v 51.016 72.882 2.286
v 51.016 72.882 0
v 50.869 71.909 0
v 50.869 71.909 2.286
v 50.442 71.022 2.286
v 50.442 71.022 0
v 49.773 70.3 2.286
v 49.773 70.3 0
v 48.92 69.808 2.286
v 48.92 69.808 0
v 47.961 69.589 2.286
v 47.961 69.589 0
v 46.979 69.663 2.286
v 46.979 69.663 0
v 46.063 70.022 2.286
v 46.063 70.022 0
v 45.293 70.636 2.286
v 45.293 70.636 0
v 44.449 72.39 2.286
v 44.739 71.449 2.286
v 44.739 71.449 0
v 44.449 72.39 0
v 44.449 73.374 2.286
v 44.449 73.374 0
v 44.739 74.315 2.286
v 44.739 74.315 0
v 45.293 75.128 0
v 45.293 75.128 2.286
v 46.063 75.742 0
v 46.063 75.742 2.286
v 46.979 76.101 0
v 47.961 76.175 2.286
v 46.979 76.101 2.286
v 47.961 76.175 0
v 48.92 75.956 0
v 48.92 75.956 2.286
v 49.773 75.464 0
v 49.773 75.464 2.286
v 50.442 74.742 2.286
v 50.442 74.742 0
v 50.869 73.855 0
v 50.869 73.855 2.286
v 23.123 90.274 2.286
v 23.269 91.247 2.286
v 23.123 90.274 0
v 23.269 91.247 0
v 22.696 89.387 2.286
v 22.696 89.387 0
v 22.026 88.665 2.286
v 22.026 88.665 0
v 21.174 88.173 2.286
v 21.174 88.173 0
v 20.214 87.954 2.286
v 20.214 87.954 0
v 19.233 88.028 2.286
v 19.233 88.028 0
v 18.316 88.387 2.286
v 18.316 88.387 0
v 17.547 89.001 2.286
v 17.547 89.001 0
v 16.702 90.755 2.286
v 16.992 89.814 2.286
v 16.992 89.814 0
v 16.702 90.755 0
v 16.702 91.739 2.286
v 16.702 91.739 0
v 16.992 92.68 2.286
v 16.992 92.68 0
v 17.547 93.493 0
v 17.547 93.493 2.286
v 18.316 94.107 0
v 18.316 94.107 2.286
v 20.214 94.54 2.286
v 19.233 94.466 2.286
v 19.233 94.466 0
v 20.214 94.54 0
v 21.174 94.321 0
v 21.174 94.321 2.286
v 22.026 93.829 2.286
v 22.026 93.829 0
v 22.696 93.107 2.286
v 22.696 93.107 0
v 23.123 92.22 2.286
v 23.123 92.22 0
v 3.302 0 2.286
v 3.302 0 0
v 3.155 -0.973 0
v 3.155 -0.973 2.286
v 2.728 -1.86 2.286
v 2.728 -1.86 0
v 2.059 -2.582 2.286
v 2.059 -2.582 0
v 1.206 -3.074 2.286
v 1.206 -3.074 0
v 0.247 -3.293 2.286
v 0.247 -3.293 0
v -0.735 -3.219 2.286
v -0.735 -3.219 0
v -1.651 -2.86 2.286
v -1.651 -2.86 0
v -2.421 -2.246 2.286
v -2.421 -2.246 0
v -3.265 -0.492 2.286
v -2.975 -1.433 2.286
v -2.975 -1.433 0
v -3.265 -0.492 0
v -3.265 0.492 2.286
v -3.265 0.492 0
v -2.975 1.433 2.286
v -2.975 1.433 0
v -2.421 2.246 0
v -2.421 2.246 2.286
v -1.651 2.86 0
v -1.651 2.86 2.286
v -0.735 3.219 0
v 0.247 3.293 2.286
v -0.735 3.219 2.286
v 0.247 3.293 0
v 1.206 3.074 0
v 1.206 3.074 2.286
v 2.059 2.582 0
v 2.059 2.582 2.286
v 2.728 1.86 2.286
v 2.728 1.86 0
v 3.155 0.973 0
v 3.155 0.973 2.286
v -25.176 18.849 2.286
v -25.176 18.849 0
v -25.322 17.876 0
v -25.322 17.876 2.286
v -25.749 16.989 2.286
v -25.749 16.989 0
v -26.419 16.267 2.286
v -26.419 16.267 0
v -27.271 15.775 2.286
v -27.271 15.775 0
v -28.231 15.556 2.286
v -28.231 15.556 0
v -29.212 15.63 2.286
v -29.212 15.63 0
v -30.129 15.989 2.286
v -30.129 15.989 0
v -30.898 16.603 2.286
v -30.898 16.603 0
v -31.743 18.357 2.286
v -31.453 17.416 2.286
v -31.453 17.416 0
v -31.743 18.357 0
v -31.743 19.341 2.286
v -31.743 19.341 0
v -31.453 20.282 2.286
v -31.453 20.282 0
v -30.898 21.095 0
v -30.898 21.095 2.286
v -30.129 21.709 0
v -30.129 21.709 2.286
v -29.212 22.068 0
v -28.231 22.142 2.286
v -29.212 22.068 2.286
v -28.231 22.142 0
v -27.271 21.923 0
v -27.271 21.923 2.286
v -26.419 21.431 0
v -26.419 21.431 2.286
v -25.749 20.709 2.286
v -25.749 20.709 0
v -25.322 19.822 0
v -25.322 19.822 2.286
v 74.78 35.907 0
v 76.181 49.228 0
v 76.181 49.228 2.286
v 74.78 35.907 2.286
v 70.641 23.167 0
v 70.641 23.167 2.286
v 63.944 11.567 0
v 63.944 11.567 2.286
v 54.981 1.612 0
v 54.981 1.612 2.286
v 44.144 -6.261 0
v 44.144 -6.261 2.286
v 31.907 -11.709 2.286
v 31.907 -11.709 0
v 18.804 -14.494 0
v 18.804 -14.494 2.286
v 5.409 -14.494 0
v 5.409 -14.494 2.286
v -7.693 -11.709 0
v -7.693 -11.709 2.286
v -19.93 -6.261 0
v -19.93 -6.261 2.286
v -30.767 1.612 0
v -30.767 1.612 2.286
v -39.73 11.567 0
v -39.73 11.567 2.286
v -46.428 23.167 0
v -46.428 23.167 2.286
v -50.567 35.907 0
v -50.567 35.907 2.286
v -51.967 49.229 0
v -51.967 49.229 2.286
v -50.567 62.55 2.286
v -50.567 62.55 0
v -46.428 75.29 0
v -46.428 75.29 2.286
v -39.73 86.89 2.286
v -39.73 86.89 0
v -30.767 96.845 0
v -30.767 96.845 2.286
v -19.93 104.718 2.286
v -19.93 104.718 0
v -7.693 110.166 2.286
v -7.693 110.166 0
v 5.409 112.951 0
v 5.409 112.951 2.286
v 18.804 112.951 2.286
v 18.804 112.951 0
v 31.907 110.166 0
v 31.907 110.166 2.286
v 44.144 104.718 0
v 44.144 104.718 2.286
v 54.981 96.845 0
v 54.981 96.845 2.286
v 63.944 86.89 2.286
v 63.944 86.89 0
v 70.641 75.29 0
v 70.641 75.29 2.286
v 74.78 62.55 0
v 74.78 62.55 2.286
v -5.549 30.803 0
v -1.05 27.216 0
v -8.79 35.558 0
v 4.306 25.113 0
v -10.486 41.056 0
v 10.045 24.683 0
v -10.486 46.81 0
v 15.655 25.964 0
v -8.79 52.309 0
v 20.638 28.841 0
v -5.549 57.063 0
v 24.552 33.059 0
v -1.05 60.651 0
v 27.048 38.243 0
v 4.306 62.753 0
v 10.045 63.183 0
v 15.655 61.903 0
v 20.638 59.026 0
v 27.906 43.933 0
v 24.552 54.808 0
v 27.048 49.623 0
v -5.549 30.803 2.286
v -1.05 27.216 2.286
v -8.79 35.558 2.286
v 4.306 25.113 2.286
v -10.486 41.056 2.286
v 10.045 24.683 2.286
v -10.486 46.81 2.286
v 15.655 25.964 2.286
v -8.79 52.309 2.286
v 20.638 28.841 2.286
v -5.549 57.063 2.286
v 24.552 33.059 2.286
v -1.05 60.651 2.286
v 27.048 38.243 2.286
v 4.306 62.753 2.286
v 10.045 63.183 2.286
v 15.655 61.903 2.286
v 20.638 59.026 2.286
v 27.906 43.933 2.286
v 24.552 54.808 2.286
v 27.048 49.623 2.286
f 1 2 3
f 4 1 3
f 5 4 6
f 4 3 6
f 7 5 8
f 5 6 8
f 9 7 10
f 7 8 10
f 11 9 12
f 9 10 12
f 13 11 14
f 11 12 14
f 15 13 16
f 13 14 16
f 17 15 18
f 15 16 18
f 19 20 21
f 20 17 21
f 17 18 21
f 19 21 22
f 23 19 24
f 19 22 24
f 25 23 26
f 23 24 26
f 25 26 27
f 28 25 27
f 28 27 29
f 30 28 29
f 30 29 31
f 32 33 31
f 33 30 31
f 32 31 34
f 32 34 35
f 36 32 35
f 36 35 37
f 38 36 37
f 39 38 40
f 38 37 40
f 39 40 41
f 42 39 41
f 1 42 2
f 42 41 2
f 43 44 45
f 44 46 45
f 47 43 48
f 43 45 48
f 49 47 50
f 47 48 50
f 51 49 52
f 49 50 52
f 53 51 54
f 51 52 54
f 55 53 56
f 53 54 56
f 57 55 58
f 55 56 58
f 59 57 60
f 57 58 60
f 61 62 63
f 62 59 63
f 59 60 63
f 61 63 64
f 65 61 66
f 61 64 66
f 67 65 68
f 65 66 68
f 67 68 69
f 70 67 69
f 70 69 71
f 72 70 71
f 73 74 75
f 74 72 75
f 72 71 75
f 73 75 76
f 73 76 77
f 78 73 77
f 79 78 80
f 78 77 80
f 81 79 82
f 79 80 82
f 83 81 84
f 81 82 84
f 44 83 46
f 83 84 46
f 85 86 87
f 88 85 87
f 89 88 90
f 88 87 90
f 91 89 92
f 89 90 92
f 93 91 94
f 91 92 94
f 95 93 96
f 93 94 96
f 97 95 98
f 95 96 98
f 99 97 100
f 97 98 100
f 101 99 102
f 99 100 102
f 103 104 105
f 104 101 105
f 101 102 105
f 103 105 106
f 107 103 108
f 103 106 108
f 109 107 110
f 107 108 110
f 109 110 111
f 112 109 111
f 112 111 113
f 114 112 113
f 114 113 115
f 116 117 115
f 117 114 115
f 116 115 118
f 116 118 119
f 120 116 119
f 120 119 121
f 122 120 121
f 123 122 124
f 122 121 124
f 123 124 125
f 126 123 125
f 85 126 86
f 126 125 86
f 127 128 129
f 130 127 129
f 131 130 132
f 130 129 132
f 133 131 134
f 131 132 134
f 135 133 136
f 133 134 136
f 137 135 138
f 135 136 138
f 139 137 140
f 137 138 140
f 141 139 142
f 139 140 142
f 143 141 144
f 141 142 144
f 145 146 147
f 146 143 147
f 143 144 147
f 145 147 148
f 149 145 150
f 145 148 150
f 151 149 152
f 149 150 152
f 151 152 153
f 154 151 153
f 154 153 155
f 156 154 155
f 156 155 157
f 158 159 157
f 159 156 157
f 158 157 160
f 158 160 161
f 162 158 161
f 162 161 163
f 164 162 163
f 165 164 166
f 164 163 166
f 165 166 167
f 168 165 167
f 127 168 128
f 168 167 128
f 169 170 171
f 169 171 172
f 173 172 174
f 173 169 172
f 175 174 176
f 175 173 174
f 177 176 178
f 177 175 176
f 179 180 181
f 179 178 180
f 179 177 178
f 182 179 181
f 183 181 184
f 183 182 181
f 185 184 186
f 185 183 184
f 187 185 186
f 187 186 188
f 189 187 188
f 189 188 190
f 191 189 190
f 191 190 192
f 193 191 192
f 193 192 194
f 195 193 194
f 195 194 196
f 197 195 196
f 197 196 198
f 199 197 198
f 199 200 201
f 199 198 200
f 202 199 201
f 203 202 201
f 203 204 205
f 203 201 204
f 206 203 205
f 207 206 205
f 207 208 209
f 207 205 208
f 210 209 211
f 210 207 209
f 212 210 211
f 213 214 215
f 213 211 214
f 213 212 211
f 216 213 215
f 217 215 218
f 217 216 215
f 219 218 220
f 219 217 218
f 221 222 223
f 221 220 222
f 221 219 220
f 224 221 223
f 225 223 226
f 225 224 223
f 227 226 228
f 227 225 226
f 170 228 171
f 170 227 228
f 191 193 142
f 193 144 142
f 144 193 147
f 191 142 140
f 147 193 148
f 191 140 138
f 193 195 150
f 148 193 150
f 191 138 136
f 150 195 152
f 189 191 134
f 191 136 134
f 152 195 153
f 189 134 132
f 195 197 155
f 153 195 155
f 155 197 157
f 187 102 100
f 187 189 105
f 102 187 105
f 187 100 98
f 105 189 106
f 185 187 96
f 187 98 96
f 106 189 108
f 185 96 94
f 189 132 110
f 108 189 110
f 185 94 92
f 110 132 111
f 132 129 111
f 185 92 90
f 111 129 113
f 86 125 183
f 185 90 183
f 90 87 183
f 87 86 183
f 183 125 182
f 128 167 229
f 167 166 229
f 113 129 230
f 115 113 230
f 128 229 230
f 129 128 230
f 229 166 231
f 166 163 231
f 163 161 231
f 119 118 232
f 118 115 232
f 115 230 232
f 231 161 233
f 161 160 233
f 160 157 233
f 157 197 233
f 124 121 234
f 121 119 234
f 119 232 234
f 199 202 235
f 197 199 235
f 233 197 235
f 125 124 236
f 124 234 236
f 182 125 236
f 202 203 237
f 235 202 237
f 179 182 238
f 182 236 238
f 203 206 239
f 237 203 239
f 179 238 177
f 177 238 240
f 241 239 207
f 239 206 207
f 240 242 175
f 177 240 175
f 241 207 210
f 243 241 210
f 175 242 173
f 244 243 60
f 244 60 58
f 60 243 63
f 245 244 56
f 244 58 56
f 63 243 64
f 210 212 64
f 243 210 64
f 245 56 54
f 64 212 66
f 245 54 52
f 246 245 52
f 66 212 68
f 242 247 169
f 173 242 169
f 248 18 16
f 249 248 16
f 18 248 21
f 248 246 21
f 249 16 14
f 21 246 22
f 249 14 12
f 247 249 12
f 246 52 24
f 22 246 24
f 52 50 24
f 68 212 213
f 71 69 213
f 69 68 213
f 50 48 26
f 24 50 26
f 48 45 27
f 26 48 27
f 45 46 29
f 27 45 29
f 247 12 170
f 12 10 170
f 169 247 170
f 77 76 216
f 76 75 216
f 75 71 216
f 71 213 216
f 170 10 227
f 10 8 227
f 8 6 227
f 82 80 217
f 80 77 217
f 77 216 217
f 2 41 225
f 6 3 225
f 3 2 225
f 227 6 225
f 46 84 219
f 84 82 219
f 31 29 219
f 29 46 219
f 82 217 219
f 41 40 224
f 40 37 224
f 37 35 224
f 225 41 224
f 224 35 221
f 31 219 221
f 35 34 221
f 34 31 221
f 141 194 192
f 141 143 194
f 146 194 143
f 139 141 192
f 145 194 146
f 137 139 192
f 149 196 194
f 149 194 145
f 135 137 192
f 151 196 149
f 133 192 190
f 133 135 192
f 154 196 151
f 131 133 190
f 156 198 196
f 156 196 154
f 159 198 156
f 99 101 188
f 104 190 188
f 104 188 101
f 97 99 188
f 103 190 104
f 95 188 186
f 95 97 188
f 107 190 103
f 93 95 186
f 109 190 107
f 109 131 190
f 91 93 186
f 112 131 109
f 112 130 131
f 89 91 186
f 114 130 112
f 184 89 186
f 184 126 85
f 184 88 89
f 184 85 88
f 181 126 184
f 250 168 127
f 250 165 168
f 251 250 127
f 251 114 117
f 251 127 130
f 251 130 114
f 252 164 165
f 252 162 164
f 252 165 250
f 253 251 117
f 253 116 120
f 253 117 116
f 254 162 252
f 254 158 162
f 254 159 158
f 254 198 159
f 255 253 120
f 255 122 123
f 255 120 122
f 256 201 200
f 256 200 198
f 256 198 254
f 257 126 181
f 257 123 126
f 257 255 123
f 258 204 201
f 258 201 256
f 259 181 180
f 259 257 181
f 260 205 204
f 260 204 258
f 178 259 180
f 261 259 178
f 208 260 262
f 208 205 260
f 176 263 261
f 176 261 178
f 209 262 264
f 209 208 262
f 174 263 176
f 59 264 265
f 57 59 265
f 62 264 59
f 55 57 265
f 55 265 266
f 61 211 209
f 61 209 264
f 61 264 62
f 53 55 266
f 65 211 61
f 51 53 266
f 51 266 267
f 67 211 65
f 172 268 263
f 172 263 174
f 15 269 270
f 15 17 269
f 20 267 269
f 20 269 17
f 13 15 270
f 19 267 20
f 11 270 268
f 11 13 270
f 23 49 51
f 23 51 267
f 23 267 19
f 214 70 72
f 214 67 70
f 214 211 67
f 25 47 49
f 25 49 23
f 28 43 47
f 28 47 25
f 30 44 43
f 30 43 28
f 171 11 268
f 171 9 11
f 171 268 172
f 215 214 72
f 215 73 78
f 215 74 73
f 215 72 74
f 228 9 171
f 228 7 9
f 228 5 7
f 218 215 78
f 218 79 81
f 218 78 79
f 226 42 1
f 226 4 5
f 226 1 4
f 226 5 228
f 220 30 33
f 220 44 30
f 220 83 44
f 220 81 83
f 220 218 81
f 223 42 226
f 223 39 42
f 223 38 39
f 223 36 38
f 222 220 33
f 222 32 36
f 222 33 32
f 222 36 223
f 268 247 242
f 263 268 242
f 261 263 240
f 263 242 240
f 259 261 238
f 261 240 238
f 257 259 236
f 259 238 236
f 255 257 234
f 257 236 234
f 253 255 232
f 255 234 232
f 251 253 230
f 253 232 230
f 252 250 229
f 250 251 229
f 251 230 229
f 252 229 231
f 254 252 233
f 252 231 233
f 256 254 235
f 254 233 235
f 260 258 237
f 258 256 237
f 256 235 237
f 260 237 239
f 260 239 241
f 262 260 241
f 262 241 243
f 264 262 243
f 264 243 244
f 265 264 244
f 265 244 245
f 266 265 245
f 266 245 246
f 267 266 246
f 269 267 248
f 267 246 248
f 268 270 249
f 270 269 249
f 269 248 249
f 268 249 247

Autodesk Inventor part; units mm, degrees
ref_plane "YZ Plane" through (0, 0, 0) normal (1, 0, 0) x (0, 1, 0)
ref_plane "XZ Plane" through (0, 0, 0) normal (0, 1, 0) x (-1, 0, 0)
ref_plane "XY Plane" through (0, 0, 0) normal (0, 0, 1) x (1, 0, 0)
sketch "Sketch1" plane through (0, 0, 0) normal (0, 0, 1) x (1, 0, 0)
  circle A0 centre (8.602, 43.9333) radius 18.288 construction
  circle A1 centre (-28.4777, 18.849) radius 3.302 projected
  circle A2 centre (0, 0) radius 3.302 projected
  circle A3 centre (19.9674, 91.247) radius 3.302 projected
  circle A4 centre (47.7138, 72.8821) radius 3.302 projected
  ellipse E0 centre (12.1068, 49.2285) end of major axis (47.4715, 102.6587) minor radius 35.9584 construction
  circle A5 centre (8.602, 43.9333) radius 19.304
  circle A6 centre (8.602, 43.9333) radius 19.05 construction
  line L0 (47.4715, 102.6587) -> (-23.2579, -4.2018) construction
  line L1 (19.9674, 91.247) -> (47.4715, 102.6587) construction
  line L2 (47.7138, 72.8821) -> (47.4715, 102.6587) construction
  circle A7 centre (12.1068, 49.2285) radius 64.0738
  point P0 (0, 0)
  dimension "d3" = 38.1
  dimension "d4" = 0.254
extrude "Extrusion1" add sketch "Sketch1" along normal blind 2.286
equation "\"BendRadius\" = Thickness"
equation "\"BendReliefWidth\" = Thickness"
equation "\"BendReliefDepth\" = 0.5 * Thickness"
equation "\"CornerReliefSize\" = 4 * Thickness"
equation "\"MinimumRemnant\" = 2 * Thickness"
equation "\"TransitionRadius\" = BendRadius"
equation "\"JacobiRadiusSize\" = BendRadius"
equation "\"GapSize\" = Thickness"
equation "\"Thickness\" = 2.286"
properties part number "Upper Hub Plate" material "Aluminum"
